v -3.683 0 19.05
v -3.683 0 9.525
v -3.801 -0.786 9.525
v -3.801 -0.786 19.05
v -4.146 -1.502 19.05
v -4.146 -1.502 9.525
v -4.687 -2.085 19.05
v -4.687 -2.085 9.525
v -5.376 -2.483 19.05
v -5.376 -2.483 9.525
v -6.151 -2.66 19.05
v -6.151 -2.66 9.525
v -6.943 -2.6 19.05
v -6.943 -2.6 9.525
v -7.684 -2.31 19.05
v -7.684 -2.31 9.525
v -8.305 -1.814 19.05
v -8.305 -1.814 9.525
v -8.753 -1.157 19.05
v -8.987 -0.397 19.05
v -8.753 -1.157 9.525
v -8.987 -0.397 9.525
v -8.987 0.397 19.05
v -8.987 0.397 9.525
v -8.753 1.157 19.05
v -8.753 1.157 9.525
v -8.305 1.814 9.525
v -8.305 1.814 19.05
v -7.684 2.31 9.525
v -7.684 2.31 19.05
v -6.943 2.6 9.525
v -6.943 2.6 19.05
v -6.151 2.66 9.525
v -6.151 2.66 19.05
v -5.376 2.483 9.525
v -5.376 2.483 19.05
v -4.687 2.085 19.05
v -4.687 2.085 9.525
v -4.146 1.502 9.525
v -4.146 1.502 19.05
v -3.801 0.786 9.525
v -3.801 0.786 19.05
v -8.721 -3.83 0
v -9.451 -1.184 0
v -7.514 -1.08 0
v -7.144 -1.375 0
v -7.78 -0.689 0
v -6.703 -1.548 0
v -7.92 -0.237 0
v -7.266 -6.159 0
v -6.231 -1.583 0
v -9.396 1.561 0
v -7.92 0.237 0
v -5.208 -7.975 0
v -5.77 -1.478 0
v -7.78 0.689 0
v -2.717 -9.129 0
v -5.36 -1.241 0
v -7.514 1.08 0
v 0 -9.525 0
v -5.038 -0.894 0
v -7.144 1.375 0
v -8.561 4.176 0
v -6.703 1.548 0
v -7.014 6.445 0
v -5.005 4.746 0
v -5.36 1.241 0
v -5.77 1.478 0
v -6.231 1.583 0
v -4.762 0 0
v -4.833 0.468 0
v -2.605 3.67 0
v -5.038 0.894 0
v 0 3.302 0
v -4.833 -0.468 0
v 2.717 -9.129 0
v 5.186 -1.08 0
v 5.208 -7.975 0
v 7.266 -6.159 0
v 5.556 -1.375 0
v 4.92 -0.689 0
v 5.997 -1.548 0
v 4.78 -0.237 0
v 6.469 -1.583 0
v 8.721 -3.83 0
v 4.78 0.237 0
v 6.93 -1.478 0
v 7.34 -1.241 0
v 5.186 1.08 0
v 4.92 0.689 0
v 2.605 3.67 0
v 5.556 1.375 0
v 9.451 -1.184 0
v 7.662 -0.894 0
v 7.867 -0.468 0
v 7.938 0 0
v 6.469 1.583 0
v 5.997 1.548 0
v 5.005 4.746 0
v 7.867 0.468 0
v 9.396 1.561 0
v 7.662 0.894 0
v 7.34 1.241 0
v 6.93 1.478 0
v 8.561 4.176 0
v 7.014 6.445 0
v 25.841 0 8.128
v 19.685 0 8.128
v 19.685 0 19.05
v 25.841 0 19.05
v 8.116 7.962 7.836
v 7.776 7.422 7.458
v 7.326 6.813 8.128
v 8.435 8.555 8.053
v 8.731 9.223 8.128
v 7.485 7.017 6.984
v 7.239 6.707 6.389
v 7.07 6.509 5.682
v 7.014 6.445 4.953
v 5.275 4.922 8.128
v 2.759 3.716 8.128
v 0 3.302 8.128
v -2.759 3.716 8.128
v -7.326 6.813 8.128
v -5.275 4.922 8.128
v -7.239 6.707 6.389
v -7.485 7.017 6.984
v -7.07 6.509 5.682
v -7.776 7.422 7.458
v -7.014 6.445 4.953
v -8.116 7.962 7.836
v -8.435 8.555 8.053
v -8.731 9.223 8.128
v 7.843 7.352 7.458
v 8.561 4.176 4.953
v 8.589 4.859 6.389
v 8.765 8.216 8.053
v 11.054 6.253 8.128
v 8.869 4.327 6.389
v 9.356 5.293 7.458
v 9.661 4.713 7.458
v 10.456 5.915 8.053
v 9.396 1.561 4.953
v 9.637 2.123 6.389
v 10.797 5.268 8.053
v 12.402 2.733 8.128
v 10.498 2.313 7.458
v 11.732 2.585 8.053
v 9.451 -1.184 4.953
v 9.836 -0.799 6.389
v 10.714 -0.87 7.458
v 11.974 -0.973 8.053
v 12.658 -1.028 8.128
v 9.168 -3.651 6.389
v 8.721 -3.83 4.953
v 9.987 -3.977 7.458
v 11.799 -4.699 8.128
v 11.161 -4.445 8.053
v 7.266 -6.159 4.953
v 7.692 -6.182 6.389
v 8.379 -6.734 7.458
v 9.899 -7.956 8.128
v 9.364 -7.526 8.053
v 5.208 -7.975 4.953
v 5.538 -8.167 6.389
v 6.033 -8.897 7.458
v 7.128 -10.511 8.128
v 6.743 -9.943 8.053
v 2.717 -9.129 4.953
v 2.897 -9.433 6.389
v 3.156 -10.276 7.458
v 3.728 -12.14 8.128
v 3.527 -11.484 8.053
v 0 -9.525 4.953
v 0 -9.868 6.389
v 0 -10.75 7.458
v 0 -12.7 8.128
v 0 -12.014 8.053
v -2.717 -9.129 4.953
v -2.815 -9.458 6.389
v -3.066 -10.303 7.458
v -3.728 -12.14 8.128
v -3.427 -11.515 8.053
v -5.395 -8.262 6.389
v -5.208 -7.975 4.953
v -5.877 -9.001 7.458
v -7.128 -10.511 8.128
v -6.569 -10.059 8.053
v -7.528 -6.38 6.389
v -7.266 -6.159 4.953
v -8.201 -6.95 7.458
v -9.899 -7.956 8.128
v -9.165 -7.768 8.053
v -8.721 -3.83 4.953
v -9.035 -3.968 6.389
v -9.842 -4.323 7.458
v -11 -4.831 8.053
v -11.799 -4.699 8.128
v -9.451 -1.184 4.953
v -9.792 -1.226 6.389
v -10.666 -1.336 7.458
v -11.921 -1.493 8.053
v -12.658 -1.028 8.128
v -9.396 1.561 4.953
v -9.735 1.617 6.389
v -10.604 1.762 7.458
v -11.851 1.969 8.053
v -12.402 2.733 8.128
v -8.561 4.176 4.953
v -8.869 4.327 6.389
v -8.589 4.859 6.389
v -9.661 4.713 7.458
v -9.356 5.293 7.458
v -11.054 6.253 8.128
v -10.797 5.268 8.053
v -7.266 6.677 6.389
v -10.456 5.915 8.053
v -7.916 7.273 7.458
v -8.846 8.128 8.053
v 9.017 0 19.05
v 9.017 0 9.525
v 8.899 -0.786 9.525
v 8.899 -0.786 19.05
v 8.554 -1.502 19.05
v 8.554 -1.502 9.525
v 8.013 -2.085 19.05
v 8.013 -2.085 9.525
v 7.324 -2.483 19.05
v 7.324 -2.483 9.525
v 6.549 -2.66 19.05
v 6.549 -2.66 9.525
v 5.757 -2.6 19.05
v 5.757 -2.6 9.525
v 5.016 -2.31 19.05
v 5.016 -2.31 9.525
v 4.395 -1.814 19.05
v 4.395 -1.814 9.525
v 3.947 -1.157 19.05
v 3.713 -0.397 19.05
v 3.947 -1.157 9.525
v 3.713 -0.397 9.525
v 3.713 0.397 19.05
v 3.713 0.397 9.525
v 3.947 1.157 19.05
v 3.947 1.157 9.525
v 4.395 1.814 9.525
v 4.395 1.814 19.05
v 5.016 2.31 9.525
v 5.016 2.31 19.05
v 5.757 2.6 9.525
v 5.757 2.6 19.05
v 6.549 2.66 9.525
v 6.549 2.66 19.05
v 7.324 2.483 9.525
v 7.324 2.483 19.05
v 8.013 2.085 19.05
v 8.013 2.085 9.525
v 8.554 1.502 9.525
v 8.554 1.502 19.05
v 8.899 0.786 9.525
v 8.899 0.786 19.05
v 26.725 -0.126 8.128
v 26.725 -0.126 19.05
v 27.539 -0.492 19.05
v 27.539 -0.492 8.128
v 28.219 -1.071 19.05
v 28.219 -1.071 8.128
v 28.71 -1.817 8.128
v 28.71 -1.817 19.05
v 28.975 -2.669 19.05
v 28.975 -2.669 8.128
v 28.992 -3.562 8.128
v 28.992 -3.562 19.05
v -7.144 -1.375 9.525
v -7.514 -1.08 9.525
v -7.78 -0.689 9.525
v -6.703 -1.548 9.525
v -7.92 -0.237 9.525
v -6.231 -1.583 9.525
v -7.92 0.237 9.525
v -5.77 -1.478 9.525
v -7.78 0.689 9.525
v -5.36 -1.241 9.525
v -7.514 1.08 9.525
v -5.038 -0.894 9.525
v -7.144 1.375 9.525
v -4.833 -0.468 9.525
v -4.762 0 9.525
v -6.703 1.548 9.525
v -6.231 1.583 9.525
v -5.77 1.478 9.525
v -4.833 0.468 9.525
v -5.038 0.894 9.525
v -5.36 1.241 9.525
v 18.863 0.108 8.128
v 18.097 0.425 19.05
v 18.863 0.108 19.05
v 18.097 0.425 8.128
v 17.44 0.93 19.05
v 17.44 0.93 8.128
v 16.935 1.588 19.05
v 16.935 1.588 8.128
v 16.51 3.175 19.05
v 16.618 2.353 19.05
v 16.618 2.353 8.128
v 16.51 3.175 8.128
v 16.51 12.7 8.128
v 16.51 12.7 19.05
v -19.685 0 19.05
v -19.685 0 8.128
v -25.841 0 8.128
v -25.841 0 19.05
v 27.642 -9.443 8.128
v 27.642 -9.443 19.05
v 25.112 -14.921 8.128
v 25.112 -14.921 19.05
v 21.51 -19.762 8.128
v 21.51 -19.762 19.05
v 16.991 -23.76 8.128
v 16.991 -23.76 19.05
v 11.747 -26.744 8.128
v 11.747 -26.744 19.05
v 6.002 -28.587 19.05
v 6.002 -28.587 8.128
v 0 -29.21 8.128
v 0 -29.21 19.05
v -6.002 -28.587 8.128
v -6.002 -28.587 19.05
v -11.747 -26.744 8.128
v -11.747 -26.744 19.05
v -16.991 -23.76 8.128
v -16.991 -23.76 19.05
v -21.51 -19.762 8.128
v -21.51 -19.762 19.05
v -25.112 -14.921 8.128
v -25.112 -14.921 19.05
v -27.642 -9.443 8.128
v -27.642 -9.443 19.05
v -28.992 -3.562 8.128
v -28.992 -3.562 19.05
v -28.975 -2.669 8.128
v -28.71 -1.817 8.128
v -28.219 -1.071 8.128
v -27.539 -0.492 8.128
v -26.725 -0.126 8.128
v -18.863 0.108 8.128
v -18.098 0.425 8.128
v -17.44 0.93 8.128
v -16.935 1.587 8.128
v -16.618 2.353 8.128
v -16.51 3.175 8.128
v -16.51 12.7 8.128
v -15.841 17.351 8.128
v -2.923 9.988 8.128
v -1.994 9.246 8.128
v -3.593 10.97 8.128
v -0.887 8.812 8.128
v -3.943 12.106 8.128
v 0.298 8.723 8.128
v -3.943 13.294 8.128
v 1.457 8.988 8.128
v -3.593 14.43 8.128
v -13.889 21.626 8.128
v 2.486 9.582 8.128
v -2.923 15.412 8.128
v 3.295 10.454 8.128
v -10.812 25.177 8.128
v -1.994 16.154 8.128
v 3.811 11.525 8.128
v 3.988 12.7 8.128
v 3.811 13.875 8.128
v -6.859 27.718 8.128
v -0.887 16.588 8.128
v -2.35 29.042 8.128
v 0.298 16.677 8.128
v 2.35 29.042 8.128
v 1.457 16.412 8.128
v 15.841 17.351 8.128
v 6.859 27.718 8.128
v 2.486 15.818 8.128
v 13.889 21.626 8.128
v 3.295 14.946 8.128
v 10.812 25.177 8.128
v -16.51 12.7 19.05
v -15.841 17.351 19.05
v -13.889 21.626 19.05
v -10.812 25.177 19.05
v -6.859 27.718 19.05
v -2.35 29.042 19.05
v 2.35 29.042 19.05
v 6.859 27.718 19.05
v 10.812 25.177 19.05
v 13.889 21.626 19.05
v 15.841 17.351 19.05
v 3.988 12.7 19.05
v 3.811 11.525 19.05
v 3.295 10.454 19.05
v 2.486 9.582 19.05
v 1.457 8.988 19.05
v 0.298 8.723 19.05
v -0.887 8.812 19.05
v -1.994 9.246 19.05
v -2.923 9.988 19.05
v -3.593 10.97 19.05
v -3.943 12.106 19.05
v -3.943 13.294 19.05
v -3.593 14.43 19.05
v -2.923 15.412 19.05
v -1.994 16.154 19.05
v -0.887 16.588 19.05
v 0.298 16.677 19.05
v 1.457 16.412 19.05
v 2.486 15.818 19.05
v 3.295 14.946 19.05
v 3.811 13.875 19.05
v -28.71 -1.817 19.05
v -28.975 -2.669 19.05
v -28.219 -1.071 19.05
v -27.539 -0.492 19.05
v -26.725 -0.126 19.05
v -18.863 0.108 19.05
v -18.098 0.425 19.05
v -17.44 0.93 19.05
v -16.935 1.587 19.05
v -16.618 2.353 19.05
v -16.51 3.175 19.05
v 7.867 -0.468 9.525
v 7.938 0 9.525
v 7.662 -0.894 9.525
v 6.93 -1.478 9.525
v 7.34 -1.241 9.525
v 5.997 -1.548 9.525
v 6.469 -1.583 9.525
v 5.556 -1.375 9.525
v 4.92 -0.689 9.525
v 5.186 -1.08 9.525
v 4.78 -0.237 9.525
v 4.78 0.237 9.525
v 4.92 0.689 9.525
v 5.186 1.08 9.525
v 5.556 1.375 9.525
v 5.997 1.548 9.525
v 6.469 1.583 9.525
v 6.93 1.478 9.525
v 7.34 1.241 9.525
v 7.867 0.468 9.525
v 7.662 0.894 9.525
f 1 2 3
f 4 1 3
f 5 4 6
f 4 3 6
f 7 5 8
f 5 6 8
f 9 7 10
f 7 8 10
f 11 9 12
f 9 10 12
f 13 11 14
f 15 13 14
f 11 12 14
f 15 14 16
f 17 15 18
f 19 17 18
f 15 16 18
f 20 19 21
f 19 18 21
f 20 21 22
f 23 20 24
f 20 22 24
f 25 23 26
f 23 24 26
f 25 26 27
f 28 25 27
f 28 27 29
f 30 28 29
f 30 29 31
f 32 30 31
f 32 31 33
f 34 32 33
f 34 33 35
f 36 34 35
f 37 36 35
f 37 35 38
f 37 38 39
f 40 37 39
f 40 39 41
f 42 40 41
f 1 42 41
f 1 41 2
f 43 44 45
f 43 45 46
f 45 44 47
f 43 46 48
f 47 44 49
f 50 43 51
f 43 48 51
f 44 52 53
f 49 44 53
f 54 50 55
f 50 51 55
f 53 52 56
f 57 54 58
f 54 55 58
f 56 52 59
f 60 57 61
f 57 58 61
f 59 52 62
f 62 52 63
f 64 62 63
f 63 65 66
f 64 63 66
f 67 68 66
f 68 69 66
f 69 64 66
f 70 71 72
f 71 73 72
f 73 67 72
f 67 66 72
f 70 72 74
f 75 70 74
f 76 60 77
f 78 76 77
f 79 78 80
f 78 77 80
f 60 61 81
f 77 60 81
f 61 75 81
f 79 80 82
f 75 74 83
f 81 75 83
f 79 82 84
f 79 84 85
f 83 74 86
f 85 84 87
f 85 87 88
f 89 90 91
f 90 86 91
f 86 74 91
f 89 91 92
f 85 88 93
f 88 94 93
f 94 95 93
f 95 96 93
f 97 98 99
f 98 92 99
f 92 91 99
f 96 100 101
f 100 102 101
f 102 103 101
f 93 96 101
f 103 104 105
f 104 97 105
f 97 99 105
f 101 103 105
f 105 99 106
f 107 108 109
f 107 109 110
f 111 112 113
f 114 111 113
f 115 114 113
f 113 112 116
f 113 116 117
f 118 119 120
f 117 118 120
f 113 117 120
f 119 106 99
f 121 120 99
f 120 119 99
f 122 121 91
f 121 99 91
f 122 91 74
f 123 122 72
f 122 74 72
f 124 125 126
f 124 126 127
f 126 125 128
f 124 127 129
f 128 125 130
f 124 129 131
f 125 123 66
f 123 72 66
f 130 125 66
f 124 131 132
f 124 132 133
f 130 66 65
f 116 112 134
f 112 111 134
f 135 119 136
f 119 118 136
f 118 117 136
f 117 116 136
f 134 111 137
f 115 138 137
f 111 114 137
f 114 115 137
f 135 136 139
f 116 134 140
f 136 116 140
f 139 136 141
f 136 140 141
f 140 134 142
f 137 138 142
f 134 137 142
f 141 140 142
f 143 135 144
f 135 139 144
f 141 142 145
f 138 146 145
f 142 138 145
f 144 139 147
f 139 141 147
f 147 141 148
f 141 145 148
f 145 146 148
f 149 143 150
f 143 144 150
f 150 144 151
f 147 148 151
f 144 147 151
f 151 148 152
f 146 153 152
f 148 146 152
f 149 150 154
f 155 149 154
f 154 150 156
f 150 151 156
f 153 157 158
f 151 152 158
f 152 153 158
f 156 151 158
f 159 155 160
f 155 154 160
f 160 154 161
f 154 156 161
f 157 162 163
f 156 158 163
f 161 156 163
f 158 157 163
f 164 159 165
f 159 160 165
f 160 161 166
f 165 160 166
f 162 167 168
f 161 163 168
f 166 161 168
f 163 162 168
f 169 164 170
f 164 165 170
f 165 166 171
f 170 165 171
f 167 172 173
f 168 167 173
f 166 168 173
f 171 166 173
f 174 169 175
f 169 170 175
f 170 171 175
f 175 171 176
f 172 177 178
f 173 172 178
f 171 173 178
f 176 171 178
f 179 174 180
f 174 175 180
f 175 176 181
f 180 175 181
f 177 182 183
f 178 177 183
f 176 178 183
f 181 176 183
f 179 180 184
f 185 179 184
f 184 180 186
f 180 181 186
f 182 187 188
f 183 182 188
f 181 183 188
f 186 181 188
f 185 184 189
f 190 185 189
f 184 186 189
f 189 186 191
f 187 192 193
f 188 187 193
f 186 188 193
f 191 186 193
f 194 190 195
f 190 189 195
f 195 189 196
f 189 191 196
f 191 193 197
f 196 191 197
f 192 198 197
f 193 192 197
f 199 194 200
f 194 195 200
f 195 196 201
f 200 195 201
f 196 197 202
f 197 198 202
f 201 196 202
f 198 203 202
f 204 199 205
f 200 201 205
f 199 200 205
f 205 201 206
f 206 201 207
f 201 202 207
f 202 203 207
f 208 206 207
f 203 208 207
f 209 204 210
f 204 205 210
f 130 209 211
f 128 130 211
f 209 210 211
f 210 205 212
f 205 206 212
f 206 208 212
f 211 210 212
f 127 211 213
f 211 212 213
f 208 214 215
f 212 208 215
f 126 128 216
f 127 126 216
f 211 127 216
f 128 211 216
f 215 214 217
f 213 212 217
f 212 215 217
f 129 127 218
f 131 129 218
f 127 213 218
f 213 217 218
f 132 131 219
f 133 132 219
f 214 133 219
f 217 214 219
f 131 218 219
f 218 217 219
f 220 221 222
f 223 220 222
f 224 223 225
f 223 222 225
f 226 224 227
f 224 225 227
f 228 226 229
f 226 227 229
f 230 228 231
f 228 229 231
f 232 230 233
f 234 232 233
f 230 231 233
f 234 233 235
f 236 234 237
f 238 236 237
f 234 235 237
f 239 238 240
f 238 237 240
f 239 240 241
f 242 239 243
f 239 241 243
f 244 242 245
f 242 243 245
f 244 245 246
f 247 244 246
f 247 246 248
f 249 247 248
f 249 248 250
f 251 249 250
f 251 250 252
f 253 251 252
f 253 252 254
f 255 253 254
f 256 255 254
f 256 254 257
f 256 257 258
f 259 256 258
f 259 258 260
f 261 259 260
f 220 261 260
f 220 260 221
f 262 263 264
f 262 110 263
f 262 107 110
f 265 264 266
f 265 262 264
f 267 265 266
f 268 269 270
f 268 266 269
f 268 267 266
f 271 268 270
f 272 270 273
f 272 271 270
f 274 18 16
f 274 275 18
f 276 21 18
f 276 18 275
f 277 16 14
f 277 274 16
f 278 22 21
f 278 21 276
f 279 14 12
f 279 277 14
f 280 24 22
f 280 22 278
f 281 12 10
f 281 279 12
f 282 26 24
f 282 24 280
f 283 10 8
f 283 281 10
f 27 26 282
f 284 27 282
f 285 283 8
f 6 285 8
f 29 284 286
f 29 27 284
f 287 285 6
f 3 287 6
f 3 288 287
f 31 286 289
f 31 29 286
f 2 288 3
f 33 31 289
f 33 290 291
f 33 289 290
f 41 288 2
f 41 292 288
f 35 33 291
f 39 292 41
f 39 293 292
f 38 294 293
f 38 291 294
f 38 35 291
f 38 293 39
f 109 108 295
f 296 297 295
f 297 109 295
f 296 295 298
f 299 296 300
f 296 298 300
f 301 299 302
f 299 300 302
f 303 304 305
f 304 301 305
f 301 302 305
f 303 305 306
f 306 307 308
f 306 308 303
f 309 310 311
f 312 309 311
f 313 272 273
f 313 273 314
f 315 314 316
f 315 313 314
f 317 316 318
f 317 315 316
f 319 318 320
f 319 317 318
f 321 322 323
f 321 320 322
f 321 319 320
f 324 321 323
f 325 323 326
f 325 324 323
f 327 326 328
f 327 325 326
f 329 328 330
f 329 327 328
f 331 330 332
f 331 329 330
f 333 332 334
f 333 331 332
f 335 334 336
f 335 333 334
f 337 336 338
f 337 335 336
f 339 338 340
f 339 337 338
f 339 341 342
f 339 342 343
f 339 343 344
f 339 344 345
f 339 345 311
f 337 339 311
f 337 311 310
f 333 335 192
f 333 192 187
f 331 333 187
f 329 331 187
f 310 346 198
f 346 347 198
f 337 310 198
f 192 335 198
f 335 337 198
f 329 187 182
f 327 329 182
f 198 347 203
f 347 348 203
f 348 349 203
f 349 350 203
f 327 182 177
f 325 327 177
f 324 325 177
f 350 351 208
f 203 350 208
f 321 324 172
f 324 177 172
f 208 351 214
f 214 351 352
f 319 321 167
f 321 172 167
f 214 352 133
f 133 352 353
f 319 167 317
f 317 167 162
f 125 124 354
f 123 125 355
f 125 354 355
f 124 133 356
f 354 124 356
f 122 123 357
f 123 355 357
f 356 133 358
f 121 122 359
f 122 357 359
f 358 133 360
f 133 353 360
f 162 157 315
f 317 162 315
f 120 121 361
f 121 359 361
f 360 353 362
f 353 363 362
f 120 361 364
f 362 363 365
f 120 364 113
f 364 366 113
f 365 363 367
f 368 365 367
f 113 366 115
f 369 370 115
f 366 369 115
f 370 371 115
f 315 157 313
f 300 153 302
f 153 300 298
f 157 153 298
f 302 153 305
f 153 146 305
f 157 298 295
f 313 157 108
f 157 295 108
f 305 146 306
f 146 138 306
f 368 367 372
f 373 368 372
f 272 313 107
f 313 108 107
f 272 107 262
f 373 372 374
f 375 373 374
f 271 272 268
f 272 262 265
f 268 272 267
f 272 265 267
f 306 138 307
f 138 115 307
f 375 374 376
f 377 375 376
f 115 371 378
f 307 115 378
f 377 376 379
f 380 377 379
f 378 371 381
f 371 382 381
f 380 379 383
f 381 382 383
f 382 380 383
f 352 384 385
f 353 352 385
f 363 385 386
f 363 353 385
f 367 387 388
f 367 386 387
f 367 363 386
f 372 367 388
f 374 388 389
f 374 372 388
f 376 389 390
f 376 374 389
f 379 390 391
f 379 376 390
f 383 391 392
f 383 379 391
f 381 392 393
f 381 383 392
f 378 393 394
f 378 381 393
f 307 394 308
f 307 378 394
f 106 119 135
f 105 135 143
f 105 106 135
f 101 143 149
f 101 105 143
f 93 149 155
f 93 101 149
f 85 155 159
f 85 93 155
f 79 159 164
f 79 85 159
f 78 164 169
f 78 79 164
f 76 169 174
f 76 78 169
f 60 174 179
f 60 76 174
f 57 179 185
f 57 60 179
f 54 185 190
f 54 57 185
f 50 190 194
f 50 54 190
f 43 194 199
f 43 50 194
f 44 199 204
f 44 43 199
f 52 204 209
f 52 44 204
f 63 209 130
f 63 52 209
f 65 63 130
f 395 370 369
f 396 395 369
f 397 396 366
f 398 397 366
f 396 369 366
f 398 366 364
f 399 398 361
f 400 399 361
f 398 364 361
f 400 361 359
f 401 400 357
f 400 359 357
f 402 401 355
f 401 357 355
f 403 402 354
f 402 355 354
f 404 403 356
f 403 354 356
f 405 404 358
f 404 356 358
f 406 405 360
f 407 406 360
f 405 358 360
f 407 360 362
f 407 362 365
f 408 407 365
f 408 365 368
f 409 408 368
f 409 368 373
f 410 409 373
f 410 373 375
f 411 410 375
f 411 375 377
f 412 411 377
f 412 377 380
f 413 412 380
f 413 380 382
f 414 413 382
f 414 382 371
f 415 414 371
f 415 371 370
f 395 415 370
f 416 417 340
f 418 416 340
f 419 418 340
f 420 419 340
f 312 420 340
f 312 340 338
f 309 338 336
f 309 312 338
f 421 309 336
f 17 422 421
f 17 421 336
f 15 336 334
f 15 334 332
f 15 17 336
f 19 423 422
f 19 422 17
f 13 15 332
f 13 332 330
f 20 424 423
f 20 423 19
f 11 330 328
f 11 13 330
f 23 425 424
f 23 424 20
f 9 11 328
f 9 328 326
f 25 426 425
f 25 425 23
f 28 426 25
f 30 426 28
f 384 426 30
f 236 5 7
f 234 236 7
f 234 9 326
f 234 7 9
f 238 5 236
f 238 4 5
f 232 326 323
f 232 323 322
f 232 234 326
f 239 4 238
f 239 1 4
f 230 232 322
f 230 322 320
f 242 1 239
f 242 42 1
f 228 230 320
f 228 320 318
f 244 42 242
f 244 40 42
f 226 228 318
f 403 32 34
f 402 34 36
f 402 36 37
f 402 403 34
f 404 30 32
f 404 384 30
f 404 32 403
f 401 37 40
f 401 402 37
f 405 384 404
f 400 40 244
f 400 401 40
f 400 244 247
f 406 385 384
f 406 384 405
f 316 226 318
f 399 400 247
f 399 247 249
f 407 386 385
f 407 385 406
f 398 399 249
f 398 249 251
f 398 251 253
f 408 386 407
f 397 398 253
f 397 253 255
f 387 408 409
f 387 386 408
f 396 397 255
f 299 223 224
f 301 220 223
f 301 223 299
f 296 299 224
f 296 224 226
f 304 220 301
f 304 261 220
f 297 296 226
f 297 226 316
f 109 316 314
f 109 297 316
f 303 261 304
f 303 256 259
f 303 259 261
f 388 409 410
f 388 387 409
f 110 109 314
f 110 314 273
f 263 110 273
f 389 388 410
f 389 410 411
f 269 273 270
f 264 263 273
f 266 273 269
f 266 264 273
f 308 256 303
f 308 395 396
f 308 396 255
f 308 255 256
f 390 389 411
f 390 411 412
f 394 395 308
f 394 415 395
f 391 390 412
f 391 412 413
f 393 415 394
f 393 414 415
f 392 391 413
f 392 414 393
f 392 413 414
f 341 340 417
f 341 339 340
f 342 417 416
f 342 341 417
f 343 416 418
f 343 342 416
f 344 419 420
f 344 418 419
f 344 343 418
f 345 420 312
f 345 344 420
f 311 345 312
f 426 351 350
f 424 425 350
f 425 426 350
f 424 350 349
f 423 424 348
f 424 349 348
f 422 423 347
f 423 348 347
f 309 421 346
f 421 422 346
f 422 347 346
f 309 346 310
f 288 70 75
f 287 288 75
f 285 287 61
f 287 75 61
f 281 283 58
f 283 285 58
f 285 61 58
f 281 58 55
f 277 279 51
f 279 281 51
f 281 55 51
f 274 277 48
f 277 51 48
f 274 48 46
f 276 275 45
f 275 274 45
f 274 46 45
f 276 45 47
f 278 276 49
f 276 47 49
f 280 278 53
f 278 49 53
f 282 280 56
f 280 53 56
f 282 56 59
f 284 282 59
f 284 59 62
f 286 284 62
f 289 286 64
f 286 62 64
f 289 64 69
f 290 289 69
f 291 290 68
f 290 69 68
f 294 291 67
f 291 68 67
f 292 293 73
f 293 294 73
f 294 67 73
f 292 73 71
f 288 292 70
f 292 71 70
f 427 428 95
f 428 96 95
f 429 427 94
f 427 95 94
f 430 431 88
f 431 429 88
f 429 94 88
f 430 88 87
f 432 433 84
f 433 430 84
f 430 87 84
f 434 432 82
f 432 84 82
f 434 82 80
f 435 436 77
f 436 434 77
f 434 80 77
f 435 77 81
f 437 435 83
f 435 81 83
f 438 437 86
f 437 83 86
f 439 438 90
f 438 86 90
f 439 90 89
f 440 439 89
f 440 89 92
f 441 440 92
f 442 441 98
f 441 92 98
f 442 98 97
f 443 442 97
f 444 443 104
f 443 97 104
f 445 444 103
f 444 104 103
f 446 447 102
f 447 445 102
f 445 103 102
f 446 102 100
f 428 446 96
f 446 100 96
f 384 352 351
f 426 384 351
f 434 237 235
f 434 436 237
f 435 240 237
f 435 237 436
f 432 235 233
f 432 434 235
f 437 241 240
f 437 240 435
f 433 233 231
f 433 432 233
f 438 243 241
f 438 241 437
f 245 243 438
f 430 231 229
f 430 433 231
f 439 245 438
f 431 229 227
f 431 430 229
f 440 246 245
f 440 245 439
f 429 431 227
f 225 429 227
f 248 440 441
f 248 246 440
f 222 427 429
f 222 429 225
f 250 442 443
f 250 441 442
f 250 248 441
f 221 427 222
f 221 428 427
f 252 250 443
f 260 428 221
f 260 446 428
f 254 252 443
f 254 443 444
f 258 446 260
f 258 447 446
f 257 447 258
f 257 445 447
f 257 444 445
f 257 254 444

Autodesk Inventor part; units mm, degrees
ref_plane "YZ Plane" through (0, 0, 0) normal (1, 0, 0) x (0, 1, 0)
ref_plane "XZ Plane" through (0, 0, 0) normal (0, 1, 0) x (-1, 0, 0)
ref_plane "XY Plane" through (0, 0, 0) normal (0, 0, 1) x (1, 0, 0)
sketch "Sketch1" plane through (0, 0, 0) normal (0, 0, 1) x (1, 0, 0)
  circle A0 centre (0, 12.7) radius 3.9878
  circle A1 centre (-6.35, 0) radius 1.5875
  circle A2 centre (6.35, 0) radius 1.5875
  circle A3 centre (0, 0) radius 9.525
  arc A4 (-28.992, -3.5622) -> (28.992, -3.5622) centre (0, 0) ccw
  line L0 (-16.51, 12.7) -> (-16.51, 3.175)
  line L1 (16.51, 12.7) -> (16.51, 3.175)
  line L2 (19.685, 0) -> (25.8407, 0)
  line L3 (-19.685, 0) -> (-25.8407, 0)
  arc A5 (16.51, 12.7) -> (-16.51, 12.7) centre (0, 12.7) ccw
  arc A6 (-25.8407, 0) -> (-28.992, -3.5622) centre (-25.8407, -3.175) ccw
  arc A7 (-19.685, 0) -> (-16.51, 3.175) centre (-19.685, 3.175) ccw
  arc A8 (16.51, 3.175) -> (19.685, 0) centre (19.685, 3.175) ccw
  arc A9 (28.992, -3.5622) -> (25.8407, 0) centre (25.8407, -3.175) ccw
  circle A10 centre (6.35, 0) radius 2.667
  circle A11 centre (-6.35, 0) radius 2.667
  circle A12 centre (0, 12.7) radius 9.398
  point P0 (-9.525, 0)
  point P1 (9.525, 0)
  point P2 (-16.51, -24.0966)
  point P3 (16.51, -24.0966)
  point P4 (-29.21, 0)
  point P5 (29.21, 0)
  point P6 (-2.077, 9.2958)
  point P7 (2.077, 9.2958)
  point P8 (7.0137, 6.4446)
  point P9 (-7.0137, 6.4446)
  dimension "d20" = 7.9756
  dimension "d44" = 3.175
  dimension "d51" = 5.334
  dimension "d52" = 5.334
  dimension "d57" = 18.796
extrude "Extrusion9" add sketch "Sketch1" along normal blind 19.05 contours A0 A3 | A0 A3 A12 | A3 A0 | A0 A3 A12 | A12 A3 | A1 | A2 | A6 L3 A7 L0 A5 L1 A8 L2 A9 A4 | A10 | A11
extrude "Extrusion10" cut sketch "Sketch1" along normal blind 8.128 contours A0 A3 | A0 A3 A12 | A3 A0 | A0 A3 A12 | A6 L3 A7 L0 A5 L1 A8 L2 A9 A4
extrude "Extrusion11" cut sketch "Sketch1" along normal blind 38.1 contours A0 A3 | A3 A0
extrude "Extrusion12" cut sketch "Sketch1" along normal blind 38.1 contours A1 | A2 | A10 | A11
extrude "Extrusion13" add sketch "Sketch1" along normal blind 9.525 contours A10 | A11
fillet "Fillet2" radius 3.175 1 edges at (0, -9.525, 8.128)
properties part number "Crank on Crankshaft_3DPrint"
